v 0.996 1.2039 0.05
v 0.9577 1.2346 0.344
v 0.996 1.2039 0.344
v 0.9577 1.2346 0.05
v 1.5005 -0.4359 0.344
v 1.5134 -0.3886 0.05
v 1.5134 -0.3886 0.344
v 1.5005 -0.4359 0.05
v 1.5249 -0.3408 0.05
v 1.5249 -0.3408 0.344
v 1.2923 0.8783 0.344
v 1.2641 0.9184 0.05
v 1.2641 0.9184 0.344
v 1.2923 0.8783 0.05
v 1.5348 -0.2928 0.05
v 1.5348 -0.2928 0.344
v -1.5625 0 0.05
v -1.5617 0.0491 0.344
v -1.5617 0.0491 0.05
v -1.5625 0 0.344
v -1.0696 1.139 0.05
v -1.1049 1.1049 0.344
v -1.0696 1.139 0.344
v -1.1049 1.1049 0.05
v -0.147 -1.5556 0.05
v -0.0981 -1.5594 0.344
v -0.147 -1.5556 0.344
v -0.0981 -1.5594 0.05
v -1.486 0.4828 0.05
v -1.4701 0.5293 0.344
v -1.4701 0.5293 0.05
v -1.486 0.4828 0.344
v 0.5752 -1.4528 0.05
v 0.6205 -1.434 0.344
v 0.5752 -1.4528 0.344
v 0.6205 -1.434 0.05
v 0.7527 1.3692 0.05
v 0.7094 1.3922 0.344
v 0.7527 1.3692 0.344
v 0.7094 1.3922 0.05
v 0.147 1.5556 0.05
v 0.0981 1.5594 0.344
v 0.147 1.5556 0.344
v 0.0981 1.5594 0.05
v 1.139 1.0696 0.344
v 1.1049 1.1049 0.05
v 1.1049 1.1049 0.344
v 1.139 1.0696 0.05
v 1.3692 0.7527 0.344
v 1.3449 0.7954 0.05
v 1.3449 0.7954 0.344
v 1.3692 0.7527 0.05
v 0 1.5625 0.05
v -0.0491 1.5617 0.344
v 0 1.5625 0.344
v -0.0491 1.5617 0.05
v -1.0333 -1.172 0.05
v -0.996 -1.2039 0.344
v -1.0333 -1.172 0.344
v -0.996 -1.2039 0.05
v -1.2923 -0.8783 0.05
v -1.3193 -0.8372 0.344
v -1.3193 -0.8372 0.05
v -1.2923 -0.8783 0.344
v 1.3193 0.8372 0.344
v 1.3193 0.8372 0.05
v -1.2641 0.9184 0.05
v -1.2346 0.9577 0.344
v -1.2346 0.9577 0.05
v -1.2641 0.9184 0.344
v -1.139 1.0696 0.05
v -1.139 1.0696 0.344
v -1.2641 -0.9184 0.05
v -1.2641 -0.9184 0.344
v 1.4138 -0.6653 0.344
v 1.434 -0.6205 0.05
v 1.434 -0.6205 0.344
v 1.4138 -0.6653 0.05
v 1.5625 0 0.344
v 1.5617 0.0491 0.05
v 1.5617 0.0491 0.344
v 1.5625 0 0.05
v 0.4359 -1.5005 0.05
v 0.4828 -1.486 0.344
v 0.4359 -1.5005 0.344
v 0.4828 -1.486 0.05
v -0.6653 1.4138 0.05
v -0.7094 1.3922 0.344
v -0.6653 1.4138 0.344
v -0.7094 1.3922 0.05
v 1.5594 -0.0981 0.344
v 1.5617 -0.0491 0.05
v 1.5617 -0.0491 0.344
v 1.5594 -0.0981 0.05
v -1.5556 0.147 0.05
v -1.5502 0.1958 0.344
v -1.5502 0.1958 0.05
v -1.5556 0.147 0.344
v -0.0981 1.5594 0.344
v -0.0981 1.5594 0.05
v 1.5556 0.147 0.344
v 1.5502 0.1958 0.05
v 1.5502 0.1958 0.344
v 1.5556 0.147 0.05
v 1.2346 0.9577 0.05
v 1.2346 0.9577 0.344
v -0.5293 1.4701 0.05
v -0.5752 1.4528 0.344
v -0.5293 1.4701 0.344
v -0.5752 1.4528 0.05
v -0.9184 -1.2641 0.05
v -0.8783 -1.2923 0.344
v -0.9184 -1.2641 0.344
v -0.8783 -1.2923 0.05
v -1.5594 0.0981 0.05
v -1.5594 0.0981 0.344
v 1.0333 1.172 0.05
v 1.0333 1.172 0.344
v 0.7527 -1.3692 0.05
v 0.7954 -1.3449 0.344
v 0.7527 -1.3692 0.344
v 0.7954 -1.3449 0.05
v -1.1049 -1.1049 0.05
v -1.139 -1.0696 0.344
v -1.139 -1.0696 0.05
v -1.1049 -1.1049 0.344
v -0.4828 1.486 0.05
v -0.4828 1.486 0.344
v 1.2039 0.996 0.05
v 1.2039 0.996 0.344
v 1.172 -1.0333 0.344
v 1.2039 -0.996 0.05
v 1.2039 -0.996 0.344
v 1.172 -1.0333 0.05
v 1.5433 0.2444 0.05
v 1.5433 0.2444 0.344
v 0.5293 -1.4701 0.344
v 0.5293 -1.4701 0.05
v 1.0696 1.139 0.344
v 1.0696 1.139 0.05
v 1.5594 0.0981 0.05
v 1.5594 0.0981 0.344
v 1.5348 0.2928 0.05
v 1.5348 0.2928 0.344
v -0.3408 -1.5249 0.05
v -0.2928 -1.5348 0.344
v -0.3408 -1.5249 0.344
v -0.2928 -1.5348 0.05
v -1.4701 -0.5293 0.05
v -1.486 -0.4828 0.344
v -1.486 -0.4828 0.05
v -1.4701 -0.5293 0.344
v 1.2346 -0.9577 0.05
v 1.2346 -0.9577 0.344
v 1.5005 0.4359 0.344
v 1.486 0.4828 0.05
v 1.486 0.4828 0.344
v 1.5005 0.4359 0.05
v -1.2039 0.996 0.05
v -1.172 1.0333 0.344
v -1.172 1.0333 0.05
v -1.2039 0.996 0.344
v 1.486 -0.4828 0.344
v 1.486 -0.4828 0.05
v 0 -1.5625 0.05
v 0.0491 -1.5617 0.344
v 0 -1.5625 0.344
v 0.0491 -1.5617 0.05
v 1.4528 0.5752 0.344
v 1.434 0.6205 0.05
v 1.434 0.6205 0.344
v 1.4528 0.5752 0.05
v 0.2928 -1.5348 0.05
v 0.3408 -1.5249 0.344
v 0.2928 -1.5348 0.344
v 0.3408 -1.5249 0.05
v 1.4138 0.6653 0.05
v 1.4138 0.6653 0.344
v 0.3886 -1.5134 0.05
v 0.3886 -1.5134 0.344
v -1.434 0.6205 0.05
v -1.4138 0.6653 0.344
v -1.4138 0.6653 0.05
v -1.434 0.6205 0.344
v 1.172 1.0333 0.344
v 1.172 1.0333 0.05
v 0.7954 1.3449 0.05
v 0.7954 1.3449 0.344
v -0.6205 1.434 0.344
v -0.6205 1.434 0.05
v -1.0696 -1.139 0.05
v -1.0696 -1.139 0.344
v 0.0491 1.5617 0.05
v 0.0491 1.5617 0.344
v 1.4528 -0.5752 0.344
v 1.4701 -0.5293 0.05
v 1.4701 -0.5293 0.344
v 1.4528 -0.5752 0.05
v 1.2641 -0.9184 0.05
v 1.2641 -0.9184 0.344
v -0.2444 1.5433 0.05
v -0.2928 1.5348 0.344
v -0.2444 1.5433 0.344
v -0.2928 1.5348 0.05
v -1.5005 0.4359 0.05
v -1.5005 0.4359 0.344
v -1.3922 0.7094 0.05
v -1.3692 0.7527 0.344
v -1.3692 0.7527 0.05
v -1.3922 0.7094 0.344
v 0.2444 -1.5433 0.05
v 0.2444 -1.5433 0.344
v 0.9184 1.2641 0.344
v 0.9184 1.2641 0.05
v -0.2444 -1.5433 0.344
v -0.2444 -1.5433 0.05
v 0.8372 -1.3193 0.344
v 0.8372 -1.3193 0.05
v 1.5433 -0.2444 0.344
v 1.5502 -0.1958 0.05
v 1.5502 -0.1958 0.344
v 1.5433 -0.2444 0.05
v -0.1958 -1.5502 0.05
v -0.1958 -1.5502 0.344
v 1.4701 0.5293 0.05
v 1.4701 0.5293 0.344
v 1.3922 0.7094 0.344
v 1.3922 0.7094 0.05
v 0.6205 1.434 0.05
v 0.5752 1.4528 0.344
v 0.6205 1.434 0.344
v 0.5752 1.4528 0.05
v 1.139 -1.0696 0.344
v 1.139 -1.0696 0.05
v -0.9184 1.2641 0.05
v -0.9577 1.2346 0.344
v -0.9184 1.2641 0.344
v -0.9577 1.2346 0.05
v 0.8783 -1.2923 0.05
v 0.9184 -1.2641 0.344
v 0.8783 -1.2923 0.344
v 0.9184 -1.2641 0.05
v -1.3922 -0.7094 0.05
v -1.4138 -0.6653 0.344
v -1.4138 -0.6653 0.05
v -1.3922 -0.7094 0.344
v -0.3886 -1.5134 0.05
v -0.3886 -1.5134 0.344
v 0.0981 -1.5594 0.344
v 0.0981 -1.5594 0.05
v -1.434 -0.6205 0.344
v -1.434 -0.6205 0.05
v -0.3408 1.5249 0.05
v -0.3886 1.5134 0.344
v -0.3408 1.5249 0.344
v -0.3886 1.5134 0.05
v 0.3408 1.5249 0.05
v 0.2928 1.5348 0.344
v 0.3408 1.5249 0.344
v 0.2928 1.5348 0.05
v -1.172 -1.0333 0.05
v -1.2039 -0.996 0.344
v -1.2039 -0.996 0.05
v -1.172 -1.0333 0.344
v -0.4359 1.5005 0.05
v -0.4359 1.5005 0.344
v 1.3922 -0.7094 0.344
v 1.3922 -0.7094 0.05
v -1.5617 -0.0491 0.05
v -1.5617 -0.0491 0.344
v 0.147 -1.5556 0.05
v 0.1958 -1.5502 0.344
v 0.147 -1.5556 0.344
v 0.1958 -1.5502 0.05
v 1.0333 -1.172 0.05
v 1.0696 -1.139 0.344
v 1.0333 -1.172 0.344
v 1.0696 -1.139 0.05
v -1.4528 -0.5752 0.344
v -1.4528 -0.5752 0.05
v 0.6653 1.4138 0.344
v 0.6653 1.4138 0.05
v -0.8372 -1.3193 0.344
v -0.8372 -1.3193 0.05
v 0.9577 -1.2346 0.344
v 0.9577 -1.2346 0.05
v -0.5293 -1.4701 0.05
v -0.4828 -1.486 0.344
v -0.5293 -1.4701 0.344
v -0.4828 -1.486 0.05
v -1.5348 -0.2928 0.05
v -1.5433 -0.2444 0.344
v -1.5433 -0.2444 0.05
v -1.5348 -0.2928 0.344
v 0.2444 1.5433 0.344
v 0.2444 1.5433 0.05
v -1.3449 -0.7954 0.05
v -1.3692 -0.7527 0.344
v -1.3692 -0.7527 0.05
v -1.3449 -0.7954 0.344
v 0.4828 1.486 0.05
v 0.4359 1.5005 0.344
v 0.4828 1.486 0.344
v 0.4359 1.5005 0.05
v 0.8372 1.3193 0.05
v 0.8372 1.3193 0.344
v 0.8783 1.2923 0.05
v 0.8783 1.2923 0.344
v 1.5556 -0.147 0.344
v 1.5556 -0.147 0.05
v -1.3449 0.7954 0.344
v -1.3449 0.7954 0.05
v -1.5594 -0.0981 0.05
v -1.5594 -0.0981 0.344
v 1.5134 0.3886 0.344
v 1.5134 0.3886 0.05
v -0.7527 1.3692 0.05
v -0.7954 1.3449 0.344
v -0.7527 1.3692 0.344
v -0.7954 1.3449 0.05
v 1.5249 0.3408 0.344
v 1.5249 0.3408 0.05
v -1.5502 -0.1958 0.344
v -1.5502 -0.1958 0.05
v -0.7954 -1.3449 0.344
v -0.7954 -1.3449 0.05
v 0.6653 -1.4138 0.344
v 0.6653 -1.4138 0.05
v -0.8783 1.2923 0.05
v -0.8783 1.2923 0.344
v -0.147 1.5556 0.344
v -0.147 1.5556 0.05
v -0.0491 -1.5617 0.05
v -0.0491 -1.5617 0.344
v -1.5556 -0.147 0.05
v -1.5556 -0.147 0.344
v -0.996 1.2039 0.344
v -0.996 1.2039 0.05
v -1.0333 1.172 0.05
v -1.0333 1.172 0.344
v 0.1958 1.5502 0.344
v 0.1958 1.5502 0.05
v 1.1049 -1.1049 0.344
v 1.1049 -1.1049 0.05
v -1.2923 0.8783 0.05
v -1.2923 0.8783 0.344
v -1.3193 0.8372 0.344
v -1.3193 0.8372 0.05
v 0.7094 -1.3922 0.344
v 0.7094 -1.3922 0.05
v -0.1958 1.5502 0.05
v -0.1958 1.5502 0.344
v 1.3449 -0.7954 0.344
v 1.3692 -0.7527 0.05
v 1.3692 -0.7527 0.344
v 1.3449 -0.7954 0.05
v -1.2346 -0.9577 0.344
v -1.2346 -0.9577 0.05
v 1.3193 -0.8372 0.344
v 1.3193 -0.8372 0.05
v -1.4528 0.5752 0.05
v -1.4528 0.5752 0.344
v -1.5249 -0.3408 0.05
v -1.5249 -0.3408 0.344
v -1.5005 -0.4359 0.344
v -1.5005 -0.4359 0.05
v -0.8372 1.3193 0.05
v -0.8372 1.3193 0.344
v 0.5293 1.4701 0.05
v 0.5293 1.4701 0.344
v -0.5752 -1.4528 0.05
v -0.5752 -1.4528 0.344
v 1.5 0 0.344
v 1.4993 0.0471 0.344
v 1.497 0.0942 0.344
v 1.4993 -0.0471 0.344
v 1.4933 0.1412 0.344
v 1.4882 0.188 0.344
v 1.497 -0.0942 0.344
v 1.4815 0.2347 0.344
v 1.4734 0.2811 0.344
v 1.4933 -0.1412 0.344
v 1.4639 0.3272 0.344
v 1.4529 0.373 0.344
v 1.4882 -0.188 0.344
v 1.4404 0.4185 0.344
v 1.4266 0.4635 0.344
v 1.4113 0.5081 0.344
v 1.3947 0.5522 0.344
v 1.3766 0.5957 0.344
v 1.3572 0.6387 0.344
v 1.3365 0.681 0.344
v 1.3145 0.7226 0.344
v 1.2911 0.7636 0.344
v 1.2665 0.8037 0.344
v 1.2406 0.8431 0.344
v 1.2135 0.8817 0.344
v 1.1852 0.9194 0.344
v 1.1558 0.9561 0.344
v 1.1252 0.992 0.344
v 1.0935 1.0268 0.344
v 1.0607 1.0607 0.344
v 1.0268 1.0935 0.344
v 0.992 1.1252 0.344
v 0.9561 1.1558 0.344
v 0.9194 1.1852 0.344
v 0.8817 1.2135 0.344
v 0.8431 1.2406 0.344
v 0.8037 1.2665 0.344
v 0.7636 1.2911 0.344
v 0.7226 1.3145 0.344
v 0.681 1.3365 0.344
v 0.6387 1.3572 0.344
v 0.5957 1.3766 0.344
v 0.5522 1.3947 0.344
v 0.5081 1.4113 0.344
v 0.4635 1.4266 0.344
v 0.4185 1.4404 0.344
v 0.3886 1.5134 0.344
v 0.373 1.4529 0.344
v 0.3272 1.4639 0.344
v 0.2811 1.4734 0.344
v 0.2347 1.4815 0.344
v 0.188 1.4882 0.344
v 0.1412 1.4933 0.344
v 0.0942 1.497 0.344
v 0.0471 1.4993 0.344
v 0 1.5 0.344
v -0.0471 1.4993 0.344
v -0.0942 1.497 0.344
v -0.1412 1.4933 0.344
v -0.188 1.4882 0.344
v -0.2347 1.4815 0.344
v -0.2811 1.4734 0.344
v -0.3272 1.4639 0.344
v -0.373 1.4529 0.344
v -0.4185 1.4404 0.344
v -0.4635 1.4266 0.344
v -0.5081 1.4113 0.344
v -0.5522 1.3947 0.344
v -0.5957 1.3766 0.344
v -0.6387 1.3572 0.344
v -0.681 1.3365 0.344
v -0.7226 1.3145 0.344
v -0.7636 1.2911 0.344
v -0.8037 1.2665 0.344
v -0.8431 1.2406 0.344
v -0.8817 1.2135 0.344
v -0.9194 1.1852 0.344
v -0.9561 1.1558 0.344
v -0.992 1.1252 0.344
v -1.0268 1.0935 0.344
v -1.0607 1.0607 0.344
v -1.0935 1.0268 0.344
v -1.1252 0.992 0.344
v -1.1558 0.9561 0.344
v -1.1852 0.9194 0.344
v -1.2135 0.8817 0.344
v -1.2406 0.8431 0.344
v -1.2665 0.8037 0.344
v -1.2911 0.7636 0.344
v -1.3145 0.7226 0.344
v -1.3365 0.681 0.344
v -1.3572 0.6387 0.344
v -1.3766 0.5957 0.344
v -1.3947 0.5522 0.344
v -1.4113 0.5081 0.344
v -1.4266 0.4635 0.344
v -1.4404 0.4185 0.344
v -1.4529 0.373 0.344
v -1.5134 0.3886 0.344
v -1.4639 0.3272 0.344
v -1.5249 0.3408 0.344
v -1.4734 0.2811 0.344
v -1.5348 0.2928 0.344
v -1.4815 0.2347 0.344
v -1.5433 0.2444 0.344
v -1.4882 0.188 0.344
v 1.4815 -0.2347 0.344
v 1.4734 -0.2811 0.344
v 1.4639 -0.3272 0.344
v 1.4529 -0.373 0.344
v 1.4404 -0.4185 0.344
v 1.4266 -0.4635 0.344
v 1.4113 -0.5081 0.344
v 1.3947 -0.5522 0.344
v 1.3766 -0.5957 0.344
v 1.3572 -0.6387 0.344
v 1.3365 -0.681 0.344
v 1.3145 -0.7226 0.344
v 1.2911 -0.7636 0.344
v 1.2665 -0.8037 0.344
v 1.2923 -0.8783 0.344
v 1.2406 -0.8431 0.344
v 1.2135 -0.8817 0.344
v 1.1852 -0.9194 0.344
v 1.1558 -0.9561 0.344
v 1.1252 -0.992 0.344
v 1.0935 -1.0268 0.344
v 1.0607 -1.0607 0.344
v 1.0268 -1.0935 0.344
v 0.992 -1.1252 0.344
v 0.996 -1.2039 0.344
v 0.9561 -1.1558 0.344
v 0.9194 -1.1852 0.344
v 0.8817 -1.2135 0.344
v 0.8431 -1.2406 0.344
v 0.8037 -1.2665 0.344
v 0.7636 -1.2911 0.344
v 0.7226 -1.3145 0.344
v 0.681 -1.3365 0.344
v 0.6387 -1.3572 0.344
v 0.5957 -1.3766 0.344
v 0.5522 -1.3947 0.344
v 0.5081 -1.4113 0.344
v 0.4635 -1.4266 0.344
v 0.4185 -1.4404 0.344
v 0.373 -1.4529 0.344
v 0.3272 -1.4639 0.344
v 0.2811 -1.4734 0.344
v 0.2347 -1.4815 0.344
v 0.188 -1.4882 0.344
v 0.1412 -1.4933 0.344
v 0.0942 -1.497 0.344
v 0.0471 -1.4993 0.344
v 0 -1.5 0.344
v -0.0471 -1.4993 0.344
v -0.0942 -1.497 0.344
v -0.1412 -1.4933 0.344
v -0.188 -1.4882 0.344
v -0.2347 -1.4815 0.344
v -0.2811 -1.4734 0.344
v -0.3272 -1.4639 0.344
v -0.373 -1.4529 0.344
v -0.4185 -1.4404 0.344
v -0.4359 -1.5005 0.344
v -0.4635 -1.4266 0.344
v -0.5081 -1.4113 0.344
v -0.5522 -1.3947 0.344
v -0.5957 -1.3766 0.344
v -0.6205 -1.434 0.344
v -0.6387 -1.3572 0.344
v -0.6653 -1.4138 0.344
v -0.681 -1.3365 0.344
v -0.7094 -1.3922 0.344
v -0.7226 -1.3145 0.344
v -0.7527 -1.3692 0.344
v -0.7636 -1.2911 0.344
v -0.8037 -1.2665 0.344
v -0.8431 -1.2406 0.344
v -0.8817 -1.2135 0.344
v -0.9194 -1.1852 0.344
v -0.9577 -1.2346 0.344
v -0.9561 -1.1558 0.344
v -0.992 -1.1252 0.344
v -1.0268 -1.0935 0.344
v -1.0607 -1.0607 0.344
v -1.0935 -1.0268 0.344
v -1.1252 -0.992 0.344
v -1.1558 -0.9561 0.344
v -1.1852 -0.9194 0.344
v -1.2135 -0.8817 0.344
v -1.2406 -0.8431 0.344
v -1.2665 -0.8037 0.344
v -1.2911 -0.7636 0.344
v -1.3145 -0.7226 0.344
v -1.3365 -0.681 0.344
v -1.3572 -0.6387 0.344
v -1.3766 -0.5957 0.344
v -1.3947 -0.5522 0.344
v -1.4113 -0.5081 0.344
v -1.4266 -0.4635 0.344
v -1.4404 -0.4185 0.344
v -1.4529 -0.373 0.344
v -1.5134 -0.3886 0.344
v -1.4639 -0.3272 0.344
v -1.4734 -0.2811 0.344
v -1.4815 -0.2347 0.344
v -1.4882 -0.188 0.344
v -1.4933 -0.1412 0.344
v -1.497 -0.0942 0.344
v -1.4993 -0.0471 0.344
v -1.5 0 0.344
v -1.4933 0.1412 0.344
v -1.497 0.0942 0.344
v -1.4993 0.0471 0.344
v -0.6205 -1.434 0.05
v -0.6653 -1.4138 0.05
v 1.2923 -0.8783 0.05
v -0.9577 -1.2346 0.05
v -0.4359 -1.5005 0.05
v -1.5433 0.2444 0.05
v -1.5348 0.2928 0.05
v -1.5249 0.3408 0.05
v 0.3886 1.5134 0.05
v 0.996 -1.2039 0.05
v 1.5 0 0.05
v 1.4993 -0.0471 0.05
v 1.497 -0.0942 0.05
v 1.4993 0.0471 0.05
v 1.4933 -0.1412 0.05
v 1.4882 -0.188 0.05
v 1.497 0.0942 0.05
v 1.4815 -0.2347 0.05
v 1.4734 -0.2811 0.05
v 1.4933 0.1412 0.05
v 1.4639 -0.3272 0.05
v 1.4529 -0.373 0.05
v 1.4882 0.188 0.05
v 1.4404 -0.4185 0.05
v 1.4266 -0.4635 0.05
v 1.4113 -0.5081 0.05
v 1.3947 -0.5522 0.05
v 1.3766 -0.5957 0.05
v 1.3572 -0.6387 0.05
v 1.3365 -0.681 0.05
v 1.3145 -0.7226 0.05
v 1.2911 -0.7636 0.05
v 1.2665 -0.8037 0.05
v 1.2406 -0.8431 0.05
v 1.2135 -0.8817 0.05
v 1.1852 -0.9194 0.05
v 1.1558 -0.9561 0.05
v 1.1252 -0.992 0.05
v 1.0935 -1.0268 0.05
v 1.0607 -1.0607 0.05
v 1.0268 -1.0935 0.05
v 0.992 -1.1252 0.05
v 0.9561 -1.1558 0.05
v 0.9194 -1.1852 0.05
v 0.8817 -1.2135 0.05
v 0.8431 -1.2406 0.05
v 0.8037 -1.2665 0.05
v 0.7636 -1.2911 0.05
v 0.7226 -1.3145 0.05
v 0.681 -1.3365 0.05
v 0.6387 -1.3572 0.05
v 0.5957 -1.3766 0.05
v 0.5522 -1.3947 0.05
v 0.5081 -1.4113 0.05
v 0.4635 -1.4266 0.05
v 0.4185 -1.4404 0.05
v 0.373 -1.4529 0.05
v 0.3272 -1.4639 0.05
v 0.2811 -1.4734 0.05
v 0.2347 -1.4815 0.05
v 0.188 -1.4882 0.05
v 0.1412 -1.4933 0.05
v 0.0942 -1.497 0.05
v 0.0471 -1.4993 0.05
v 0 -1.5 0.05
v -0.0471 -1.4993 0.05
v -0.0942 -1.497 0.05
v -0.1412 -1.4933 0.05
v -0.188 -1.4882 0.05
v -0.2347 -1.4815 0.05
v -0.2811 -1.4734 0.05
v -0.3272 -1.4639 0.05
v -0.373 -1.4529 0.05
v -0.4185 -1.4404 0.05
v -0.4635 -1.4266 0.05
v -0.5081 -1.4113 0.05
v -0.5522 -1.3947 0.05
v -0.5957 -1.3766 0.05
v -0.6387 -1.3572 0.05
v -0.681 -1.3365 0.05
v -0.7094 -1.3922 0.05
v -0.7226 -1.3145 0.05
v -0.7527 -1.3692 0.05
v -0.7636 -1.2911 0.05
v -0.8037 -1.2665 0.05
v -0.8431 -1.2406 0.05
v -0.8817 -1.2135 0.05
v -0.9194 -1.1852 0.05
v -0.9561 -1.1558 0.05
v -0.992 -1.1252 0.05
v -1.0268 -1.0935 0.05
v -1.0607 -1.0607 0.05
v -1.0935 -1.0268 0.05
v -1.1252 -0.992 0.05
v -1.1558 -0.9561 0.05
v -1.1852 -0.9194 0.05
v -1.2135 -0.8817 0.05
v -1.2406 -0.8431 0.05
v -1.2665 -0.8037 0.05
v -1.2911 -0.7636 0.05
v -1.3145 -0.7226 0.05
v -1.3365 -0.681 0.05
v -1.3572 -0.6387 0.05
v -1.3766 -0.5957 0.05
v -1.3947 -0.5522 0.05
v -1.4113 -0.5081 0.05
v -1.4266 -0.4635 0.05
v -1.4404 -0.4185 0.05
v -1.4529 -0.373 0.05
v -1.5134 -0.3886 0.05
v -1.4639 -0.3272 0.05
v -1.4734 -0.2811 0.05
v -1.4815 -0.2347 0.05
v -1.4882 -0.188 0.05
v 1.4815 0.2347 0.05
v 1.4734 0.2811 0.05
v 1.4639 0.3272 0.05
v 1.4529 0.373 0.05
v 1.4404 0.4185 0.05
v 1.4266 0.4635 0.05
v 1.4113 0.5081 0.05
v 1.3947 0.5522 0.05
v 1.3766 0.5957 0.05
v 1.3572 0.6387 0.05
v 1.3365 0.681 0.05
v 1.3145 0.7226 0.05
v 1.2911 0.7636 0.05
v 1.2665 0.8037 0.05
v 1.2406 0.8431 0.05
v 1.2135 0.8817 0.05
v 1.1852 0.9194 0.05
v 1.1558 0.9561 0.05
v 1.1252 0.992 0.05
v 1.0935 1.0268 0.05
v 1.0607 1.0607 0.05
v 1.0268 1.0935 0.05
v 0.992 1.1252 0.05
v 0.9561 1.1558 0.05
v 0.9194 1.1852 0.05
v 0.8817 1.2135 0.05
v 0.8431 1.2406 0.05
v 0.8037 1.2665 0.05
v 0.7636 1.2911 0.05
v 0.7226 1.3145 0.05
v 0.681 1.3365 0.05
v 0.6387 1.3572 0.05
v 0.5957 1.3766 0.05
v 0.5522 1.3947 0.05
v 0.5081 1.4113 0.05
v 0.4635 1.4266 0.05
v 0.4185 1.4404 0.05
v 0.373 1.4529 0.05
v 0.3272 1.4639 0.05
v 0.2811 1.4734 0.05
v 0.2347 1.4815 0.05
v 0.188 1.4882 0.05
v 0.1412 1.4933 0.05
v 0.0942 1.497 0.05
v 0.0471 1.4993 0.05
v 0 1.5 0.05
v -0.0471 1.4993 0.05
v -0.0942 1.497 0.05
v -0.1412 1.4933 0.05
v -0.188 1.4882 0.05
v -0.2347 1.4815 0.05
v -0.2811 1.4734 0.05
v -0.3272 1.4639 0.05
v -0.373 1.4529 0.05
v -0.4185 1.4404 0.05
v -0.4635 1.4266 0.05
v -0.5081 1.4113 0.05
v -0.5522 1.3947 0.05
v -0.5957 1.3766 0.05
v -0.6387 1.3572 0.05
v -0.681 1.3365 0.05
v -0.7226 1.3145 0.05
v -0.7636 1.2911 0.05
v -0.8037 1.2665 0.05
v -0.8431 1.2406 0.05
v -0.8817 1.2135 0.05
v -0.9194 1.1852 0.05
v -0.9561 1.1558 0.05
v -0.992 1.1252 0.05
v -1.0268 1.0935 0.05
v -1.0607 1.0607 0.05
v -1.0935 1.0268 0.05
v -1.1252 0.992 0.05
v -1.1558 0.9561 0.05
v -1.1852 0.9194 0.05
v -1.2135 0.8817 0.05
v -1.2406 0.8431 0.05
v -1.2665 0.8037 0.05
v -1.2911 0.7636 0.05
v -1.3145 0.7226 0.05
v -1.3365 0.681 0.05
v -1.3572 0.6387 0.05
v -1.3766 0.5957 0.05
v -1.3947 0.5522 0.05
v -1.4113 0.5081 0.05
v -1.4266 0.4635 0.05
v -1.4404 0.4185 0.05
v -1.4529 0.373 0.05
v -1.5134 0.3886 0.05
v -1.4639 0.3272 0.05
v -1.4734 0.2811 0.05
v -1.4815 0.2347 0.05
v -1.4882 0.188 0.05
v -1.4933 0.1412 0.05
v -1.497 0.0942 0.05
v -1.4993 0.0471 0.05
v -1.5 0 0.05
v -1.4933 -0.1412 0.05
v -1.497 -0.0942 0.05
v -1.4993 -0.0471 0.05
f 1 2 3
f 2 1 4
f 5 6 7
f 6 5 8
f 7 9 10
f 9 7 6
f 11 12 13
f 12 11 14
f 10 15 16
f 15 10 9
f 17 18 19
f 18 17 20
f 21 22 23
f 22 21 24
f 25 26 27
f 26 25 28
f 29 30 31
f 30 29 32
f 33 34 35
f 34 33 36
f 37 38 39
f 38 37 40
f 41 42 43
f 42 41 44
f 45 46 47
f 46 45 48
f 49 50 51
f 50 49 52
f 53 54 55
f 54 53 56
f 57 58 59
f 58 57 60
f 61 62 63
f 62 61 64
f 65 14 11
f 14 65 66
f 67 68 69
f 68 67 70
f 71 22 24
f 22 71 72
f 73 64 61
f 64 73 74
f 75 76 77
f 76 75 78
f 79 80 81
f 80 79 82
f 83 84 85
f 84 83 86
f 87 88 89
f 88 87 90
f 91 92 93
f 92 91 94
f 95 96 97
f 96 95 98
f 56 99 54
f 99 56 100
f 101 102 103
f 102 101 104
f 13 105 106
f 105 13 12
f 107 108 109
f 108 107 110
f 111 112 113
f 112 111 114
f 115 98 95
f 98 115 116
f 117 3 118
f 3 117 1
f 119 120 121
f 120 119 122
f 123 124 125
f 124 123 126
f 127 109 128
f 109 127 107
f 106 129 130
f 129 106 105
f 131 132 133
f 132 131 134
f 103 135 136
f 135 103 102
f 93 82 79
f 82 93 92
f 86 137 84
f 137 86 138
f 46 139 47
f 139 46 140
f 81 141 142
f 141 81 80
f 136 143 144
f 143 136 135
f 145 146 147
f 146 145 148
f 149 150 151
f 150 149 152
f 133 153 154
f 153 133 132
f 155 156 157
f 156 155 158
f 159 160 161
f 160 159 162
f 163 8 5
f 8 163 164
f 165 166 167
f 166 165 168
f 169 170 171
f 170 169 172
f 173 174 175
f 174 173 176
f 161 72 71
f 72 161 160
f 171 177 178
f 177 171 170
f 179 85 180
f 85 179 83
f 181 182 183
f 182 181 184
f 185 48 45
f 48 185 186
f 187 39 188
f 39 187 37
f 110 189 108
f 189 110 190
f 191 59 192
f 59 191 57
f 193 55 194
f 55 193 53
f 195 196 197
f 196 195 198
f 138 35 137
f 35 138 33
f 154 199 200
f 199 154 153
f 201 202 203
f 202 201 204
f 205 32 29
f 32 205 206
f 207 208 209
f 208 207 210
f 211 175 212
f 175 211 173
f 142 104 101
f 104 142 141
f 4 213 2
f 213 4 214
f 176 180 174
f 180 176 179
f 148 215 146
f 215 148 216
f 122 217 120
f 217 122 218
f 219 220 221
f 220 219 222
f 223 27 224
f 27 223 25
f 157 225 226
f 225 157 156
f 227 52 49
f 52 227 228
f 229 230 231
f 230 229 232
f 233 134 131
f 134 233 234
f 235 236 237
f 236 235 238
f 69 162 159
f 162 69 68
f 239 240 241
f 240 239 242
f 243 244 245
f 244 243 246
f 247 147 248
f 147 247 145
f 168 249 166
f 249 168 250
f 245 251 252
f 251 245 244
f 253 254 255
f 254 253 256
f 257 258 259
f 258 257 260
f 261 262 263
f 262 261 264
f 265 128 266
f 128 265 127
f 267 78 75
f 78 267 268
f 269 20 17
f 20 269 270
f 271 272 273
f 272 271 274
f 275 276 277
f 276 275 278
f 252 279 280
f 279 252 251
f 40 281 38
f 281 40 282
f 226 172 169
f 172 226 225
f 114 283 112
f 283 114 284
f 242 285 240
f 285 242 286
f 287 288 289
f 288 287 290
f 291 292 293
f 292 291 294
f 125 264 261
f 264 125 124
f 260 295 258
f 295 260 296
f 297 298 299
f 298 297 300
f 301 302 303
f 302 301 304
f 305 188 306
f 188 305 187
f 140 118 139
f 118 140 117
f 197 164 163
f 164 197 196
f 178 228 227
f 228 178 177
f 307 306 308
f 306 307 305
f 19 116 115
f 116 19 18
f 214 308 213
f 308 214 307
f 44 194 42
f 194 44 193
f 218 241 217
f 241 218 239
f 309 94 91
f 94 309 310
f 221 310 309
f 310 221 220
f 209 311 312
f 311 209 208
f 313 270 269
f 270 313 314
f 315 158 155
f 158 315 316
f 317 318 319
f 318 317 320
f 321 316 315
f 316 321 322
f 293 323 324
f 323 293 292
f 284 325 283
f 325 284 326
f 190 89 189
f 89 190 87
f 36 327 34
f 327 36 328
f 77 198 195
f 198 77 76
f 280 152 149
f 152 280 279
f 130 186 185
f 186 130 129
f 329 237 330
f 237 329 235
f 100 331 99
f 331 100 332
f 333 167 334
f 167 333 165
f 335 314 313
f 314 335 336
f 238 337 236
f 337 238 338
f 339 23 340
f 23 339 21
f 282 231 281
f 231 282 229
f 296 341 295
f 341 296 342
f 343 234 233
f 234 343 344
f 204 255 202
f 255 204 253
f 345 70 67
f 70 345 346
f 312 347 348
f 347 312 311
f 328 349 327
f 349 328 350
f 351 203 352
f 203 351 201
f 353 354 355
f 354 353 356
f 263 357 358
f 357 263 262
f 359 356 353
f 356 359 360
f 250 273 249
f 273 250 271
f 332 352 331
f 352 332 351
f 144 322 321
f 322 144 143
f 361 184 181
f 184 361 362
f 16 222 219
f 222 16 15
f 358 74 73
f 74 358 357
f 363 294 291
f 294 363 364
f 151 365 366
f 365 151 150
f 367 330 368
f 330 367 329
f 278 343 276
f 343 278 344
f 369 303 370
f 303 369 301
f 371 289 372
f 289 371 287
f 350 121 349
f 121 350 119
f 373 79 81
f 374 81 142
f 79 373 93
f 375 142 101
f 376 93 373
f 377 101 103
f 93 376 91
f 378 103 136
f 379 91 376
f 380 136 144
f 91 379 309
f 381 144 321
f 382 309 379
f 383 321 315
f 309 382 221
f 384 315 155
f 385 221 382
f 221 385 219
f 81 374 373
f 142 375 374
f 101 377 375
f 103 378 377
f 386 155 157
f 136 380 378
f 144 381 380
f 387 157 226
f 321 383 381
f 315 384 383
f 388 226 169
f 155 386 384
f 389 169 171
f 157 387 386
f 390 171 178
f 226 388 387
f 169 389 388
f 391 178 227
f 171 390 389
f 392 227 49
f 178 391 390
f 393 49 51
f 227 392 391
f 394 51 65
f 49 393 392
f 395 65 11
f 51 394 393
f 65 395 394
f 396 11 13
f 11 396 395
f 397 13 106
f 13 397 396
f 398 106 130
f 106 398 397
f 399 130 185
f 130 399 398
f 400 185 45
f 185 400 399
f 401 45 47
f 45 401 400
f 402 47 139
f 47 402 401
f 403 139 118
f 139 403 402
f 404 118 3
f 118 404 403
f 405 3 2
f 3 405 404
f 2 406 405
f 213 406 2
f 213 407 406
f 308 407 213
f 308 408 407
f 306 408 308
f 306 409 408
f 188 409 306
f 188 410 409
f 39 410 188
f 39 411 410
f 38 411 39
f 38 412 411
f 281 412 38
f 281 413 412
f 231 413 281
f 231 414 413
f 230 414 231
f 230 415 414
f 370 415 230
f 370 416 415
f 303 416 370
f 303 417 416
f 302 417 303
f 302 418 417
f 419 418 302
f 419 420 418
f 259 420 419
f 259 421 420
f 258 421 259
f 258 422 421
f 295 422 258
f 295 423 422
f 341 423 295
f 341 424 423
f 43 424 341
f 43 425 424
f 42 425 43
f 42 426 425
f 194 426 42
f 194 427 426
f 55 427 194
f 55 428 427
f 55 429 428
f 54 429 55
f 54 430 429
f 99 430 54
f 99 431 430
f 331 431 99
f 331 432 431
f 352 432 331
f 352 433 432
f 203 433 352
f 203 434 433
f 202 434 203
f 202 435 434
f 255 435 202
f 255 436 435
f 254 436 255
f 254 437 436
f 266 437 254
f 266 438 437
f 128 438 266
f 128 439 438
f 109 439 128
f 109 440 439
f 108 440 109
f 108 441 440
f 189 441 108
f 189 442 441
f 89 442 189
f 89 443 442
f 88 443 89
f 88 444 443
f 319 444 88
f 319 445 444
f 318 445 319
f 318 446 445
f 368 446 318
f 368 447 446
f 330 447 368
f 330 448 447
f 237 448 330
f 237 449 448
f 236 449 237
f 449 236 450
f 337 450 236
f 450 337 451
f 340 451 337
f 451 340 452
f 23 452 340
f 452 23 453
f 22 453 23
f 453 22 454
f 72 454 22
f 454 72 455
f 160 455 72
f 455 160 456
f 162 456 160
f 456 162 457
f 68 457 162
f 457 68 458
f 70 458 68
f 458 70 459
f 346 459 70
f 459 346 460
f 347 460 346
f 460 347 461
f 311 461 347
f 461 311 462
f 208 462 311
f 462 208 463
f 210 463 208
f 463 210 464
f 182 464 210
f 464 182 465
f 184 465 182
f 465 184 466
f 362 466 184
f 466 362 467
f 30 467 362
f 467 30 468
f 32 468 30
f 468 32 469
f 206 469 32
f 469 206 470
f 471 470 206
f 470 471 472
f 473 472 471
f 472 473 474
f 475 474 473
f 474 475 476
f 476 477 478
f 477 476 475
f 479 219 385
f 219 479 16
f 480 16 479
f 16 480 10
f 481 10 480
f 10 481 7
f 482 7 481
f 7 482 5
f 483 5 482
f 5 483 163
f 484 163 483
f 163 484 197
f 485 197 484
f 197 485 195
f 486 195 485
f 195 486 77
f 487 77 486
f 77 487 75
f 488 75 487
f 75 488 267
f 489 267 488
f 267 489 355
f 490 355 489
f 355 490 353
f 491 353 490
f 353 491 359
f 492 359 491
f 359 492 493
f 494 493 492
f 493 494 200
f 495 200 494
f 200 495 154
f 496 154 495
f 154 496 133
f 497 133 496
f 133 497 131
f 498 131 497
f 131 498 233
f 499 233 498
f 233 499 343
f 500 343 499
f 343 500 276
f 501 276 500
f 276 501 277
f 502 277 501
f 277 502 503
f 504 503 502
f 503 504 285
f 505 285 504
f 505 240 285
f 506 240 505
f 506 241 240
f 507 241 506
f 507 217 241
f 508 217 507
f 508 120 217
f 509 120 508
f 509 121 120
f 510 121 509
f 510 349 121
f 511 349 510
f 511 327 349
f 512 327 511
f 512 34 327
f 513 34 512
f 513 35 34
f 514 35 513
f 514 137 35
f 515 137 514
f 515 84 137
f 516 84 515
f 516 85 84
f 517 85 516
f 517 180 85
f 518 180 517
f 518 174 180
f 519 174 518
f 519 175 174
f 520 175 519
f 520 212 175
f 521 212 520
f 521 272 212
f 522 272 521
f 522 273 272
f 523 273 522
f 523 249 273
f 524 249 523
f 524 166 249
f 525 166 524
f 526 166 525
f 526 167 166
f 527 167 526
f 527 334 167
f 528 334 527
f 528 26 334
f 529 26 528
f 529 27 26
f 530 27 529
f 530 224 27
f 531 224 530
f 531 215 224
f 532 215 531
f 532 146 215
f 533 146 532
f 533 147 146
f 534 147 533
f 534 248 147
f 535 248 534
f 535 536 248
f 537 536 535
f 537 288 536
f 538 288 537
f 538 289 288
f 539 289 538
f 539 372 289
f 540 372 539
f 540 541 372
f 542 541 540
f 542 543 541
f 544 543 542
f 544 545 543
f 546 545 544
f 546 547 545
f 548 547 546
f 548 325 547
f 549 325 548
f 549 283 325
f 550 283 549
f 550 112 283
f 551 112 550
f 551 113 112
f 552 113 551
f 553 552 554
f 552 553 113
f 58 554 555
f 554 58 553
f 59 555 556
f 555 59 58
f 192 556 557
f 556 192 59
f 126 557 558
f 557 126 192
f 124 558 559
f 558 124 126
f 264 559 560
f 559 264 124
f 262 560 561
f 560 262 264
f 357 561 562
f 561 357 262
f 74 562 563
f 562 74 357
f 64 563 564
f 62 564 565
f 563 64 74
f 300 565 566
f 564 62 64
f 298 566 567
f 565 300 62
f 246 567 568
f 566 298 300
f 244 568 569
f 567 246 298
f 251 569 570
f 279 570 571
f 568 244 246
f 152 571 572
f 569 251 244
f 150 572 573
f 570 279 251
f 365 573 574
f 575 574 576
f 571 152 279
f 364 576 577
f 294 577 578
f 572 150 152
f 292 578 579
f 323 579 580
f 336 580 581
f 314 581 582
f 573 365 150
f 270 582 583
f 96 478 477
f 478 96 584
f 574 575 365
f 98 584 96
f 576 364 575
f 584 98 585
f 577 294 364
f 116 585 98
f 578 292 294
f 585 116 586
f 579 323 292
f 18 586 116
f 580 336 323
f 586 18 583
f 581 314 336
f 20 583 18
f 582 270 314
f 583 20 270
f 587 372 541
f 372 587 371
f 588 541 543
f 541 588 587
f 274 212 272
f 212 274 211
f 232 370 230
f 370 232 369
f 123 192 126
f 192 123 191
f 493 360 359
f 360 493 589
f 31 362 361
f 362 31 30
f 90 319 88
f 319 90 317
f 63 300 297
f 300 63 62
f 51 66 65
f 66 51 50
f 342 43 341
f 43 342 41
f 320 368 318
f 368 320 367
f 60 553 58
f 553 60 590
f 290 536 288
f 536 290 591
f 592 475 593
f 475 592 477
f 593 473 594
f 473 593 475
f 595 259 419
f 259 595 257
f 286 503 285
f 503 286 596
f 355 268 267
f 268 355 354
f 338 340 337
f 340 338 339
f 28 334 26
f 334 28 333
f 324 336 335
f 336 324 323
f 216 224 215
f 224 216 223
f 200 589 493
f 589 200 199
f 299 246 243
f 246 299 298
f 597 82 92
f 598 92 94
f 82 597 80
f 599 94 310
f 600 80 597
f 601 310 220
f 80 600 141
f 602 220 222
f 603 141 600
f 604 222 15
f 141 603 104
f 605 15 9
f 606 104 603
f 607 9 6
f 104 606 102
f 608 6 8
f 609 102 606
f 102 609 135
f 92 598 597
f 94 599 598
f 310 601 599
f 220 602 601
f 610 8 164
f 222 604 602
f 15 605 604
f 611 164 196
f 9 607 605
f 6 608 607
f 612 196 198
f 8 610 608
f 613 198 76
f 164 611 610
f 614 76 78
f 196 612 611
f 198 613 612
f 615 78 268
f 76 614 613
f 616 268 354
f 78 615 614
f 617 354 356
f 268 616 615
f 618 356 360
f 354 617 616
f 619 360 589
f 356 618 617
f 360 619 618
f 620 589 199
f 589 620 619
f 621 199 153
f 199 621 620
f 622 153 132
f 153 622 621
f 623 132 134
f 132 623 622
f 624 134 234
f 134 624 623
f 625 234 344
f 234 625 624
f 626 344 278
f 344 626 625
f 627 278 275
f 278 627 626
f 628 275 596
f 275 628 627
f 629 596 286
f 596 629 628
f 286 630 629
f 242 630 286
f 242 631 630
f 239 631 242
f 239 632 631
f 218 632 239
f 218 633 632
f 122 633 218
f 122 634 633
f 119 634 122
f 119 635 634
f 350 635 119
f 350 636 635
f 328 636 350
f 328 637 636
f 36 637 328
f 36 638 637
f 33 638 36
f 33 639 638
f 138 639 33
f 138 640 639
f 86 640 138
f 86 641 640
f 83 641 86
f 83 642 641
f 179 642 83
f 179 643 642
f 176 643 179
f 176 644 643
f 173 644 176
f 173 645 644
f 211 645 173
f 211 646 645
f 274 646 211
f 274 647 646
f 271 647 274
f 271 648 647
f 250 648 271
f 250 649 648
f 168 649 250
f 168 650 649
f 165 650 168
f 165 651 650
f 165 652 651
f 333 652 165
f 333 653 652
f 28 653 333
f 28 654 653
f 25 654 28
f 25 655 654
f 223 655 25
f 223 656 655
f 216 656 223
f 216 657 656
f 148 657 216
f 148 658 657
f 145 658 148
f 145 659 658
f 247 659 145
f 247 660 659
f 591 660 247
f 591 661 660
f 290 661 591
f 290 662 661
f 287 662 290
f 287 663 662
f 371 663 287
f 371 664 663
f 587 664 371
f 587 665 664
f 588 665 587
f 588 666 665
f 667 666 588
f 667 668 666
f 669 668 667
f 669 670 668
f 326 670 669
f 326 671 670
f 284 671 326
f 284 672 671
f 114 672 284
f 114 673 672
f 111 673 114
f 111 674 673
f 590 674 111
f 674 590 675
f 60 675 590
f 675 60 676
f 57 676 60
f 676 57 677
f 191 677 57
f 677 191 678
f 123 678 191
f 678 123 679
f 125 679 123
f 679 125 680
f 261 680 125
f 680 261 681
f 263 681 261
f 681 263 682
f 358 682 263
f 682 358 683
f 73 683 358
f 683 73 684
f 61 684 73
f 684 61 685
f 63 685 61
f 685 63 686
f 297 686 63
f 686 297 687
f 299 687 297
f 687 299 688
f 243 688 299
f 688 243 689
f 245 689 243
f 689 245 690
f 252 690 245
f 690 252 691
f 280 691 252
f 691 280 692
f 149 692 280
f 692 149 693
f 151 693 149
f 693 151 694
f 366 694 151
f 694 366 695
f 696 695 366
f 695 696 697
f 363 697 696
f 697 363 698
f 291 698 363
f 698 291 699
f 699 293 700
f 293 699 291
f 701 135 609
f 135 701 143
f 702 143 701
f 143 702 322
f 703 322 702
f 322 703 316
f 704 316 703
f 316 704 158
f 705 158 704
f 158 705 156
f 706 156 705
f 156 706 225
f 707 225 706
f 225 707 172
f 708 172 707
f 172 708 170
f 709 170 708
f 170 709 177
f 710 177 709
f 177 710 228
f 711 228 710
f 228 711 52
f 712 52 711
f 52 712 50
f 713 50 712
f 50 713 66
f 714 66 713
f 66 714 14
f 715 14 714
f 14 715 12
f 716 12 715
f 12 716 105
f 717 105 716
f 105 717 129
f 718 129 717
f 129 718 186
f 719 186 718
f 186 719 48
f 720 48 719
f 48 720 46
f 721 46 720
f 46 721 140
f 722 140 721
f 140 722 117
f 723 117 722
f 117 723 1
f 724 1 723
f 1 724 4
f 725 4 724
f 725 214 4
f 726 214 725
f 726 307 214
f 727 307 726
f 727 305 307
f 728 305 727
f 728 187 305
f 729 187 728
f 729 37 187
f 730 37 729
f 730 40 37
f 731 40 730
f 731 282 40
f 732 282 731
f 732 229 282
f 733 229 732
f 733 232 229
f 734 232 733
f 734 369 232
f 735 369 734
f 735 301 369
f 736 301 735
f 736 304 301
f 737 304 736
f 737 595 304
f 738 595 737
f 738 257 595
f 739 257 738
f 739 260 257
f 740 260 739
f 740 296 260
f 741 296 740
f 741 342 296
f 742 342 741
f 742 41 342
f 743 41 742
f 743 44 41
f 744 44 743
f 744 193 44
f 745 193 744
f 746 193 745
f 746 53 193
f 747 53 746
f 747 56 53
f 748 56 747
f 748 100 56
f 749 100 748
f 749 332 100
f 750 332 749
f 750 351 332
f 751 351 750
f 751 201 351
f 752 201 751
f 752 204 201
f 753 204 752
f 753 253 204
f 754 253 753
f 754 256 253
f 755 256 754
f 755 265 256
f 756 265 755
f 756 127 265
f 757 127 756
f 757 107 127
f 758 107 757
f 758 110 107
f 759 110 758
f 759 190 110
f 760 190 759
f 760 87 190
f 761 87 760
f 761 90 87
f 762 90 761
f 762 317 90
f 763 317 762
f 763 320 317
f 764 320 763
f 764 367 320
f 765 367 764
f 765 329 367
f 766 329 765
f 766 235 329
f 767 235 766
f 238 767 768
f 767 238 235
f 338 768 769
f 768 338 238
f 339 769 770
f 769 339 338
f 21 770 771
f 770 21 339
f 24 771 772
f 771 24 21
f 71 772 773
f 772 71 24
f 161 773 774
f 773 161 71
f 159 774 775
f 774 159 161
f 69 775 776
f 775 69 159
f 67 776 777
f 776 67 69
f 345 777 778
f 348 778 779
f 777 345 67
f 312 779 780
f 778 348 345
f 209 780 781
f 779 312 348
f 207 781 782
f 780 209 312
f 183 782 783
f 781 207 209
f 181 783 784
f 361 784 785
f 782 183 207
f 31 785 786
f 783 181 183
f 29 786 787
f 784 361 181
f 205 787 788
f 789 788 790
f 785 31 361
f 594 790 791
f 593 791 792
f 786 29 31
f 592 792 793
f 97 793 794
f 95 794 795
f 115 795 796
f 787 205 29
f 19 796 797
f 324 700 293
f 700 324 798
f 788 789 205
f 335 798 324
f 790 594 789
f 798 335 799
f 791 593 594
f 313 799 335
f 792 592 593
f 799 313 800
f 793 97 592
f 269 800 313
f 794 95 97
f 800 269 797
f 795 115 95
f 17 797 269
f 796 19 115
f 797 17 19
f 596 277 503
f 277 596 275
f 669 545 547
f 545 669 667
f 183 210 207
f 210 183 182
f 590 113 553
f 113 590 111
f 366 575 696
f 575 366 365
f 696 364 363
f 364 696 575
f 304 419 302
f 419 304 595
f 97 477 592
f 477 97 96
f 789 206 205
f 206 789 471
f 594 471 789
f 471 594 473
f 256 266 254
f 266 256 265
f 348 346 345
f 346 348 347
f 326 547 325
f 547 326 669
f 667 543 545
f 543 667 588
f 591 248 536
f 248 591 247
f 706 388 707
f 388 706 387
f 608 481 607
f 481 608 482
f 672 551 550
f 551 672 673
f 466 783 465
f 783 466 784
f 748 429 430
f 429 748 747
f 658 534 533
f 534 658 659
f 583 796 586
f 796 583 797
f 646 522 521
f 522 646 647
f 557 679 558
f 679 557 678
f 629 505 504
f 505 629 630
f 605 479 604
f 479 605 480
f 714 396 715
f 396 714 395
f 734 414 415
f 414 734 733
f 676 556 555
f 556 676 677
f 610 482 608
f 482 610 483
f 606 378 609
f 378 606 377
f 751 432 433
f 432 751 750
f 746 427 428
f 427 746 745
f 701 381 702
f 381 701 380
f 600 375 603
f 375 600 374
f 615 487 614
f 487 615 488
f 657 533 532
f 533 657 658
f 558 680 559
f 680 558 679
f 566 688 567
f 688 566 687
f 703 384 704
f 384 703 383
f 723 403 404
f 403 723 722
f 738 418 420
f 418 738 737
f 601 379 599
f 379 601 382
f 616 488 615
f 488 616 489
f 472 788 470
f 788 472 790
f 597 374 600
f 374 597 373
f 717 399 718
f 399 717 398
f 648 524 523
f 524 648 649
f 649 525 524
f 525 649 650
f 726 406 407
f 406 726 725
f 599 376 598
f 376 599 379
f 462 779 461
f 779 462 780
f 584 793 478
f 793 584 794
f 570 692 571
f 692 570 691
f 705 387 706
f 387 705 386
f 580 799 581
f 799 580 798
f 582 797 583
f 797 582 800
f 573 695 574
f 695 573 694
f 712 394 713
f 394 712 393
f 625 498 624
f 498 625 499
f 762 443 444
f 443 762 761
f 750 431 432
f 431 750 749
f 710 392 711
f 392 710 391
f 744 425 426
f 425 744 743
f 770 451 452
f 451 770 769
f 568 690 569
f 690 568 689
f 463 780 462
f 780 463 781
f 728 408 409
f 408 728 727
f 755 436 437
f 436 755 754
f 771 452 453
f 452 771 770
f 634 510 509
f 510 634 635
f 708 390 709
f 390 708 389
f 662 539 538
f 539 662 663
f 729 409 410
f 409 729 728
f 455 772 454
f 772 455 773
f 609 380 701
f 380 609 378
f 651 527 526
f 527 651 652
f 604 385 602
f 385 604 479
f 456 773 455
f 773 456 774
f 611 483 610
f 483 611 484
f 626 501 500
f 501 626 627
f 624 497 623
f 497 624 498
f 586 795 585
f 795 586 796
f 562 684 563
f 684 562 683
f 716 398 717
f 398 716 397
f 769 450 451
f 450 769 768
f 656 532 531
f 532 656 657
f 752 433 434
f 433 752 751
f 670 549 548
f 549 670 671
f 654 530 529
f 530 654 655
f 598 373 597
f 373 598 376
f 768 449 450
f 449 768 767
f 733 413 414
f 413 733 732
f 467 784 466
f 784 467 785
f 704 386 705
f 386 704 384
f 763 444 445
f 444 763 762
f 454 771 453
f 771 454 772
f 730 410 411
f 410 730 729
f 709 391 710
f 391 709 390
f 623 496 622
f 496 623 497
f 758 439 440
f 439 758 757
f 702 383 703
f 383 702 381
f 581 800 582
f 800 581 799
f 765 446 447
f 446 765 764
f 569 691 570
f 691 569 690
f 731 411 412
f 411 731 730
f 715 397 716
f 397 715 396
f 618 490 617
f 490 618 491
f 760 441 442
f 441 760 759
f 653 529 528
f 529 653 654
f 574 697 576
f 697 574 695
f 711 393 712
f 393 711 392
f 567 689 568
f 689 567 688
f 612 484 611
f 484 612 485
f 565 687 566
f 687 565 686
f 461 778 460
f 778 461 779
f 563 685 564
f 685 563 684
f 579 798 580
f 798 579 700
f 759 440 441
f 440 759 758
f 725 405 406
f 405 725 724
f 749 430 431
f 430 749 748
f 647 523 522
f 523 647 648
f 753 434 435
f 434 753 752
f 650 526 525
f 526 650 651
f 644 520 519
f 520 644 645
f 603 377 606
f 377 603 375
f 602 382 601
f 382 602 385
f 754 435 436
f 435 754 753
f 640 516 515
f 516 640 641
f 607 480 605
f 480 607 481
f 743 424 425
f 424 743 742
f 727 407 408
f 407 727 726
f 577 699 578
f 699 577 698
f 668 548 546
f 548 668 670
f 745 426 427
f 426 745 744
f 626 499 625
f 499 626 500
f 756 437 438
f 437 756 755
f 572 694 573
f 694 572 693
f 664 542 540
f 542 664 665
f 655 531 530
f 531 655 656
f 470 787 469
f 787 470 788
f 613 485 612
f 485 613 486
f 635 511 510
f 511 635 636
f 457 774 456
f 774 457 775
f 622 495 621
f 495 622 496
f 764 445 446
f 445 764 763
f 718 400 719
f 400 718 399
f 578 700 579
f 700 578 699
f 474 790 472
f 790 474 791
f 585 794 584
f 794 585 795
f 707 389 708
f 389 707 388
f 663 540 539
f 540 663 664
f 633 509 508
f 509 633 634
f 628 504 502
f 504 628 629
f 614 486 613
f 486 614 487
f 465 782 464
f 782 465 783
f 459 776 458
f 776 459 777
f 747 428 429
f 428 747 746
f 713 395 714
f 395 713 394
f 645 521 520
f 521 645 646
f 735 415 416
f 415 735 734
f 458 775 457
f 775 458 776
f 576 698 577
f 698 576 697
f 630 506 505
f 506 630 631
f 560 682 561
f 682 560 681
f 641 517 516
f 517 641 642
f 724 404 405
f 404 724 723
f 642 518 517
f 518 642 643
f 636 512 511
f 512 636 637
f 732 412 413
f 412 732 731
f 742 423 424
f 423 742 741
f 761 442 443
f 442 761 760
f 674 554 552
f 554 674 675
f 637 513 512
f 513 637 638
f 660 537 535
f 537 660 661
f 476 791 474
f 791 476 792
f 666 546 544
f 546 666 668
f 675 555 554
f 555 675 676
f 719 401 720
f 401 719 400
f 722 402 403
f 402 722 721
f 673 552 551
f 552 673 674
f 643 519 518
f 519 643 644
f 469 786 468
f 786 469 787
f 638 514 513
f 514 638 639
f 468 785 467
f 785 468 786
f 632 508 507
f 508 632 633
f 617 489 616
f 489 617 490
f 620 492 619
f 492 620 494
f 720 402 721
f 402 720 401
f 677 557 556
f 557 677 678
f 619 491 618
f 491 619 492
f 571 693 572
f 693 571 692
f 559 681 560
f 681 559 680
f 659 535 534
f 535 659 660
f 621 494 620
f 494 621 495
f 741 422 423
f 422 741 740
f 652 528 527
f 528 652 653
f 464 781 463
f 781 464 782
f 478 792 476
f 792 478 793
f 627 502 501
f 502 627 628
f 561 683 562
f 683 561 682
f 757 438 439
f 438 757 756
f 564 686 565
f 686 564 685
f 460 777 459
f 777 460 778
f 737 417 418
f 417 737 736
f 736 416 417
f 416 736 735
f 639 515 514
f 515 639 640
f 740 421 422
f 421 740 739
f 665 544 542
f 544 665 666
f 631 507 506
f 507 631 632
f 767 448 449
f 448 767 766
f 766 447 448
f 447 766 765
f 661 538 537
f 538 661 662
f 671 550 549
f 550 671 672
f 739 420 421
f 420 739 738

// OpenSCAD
module MountingScrewNut(rot)
{
  rotate(a = rot, v = [0, 0, 1])
    union() {
      // Nut access
      cube(size = [0.210, 0.350, 0.075], center = true);

      // Screw shaft
      cylinder(h = 0.225, d = 0.125, center = true, $fn = 50);
    }
}

union() {
  difference() {
    linear_extrude(height = 0.25, center = false, convexity = 10, slices = 10)
       import(file = "FlangeAOutline2.dxf");

    // cut center hole
    cylinder (h = 1.0, d=2.850, center=true, $fn = 250);

    // cut panel mounting holes
    translate([1.25, 1.25, 0])
       cylinder(h = 1.0, d = 0.188, center = true, $fn = 40);
    translate([-1.25, 1.25, 0])
       cylinder(h = 1.0, d = 0.188, center = true, $fn = 40);
    translate([1.25, -1.25, 0])
       cylinder(h = 1.0, d = 0.188, center = true, $fn = 40);
    translate([-1.25, -1.25, 0])
       cylinder(h = 1.0, d = 0.188, center = true, $fn = 40);

    // assembly nuts
    translate([1, 2.75/2, 0.1])
      MountingScrewNut(-22);
    translate([-1, 2.75/2, 0.1])
      MountingScrewNut(22);
    translate([1, -2.75/2, 0.1])
      MountingScrewNut(22);
    translate([-1, -2.75/2, 0.1])
      MountingScrewNut(-22);
    translate([2.75/2, 1, 0.1])
      MountingScrewNut(-67);
    translate([-2.75/2, 1, 0.1])
      MountingScrewNut(67);
    translate([2.75/2, -1, 0.1])
      MountingScrewNut(67);
    translate([-2.75/2, -1, 0.1])
      MountingScrewNut(-67);
  }

  // rim for bezel glass
  translate([0, 0, 0.05])
    difference() {
      cylinder (h = 0.188/2 + 0.250 - 0.05, d=3.125, center = false, $fn = 200);
      cylinder (h = 1.0, d=3.000, center = true, $fn = 200);
  }

}
